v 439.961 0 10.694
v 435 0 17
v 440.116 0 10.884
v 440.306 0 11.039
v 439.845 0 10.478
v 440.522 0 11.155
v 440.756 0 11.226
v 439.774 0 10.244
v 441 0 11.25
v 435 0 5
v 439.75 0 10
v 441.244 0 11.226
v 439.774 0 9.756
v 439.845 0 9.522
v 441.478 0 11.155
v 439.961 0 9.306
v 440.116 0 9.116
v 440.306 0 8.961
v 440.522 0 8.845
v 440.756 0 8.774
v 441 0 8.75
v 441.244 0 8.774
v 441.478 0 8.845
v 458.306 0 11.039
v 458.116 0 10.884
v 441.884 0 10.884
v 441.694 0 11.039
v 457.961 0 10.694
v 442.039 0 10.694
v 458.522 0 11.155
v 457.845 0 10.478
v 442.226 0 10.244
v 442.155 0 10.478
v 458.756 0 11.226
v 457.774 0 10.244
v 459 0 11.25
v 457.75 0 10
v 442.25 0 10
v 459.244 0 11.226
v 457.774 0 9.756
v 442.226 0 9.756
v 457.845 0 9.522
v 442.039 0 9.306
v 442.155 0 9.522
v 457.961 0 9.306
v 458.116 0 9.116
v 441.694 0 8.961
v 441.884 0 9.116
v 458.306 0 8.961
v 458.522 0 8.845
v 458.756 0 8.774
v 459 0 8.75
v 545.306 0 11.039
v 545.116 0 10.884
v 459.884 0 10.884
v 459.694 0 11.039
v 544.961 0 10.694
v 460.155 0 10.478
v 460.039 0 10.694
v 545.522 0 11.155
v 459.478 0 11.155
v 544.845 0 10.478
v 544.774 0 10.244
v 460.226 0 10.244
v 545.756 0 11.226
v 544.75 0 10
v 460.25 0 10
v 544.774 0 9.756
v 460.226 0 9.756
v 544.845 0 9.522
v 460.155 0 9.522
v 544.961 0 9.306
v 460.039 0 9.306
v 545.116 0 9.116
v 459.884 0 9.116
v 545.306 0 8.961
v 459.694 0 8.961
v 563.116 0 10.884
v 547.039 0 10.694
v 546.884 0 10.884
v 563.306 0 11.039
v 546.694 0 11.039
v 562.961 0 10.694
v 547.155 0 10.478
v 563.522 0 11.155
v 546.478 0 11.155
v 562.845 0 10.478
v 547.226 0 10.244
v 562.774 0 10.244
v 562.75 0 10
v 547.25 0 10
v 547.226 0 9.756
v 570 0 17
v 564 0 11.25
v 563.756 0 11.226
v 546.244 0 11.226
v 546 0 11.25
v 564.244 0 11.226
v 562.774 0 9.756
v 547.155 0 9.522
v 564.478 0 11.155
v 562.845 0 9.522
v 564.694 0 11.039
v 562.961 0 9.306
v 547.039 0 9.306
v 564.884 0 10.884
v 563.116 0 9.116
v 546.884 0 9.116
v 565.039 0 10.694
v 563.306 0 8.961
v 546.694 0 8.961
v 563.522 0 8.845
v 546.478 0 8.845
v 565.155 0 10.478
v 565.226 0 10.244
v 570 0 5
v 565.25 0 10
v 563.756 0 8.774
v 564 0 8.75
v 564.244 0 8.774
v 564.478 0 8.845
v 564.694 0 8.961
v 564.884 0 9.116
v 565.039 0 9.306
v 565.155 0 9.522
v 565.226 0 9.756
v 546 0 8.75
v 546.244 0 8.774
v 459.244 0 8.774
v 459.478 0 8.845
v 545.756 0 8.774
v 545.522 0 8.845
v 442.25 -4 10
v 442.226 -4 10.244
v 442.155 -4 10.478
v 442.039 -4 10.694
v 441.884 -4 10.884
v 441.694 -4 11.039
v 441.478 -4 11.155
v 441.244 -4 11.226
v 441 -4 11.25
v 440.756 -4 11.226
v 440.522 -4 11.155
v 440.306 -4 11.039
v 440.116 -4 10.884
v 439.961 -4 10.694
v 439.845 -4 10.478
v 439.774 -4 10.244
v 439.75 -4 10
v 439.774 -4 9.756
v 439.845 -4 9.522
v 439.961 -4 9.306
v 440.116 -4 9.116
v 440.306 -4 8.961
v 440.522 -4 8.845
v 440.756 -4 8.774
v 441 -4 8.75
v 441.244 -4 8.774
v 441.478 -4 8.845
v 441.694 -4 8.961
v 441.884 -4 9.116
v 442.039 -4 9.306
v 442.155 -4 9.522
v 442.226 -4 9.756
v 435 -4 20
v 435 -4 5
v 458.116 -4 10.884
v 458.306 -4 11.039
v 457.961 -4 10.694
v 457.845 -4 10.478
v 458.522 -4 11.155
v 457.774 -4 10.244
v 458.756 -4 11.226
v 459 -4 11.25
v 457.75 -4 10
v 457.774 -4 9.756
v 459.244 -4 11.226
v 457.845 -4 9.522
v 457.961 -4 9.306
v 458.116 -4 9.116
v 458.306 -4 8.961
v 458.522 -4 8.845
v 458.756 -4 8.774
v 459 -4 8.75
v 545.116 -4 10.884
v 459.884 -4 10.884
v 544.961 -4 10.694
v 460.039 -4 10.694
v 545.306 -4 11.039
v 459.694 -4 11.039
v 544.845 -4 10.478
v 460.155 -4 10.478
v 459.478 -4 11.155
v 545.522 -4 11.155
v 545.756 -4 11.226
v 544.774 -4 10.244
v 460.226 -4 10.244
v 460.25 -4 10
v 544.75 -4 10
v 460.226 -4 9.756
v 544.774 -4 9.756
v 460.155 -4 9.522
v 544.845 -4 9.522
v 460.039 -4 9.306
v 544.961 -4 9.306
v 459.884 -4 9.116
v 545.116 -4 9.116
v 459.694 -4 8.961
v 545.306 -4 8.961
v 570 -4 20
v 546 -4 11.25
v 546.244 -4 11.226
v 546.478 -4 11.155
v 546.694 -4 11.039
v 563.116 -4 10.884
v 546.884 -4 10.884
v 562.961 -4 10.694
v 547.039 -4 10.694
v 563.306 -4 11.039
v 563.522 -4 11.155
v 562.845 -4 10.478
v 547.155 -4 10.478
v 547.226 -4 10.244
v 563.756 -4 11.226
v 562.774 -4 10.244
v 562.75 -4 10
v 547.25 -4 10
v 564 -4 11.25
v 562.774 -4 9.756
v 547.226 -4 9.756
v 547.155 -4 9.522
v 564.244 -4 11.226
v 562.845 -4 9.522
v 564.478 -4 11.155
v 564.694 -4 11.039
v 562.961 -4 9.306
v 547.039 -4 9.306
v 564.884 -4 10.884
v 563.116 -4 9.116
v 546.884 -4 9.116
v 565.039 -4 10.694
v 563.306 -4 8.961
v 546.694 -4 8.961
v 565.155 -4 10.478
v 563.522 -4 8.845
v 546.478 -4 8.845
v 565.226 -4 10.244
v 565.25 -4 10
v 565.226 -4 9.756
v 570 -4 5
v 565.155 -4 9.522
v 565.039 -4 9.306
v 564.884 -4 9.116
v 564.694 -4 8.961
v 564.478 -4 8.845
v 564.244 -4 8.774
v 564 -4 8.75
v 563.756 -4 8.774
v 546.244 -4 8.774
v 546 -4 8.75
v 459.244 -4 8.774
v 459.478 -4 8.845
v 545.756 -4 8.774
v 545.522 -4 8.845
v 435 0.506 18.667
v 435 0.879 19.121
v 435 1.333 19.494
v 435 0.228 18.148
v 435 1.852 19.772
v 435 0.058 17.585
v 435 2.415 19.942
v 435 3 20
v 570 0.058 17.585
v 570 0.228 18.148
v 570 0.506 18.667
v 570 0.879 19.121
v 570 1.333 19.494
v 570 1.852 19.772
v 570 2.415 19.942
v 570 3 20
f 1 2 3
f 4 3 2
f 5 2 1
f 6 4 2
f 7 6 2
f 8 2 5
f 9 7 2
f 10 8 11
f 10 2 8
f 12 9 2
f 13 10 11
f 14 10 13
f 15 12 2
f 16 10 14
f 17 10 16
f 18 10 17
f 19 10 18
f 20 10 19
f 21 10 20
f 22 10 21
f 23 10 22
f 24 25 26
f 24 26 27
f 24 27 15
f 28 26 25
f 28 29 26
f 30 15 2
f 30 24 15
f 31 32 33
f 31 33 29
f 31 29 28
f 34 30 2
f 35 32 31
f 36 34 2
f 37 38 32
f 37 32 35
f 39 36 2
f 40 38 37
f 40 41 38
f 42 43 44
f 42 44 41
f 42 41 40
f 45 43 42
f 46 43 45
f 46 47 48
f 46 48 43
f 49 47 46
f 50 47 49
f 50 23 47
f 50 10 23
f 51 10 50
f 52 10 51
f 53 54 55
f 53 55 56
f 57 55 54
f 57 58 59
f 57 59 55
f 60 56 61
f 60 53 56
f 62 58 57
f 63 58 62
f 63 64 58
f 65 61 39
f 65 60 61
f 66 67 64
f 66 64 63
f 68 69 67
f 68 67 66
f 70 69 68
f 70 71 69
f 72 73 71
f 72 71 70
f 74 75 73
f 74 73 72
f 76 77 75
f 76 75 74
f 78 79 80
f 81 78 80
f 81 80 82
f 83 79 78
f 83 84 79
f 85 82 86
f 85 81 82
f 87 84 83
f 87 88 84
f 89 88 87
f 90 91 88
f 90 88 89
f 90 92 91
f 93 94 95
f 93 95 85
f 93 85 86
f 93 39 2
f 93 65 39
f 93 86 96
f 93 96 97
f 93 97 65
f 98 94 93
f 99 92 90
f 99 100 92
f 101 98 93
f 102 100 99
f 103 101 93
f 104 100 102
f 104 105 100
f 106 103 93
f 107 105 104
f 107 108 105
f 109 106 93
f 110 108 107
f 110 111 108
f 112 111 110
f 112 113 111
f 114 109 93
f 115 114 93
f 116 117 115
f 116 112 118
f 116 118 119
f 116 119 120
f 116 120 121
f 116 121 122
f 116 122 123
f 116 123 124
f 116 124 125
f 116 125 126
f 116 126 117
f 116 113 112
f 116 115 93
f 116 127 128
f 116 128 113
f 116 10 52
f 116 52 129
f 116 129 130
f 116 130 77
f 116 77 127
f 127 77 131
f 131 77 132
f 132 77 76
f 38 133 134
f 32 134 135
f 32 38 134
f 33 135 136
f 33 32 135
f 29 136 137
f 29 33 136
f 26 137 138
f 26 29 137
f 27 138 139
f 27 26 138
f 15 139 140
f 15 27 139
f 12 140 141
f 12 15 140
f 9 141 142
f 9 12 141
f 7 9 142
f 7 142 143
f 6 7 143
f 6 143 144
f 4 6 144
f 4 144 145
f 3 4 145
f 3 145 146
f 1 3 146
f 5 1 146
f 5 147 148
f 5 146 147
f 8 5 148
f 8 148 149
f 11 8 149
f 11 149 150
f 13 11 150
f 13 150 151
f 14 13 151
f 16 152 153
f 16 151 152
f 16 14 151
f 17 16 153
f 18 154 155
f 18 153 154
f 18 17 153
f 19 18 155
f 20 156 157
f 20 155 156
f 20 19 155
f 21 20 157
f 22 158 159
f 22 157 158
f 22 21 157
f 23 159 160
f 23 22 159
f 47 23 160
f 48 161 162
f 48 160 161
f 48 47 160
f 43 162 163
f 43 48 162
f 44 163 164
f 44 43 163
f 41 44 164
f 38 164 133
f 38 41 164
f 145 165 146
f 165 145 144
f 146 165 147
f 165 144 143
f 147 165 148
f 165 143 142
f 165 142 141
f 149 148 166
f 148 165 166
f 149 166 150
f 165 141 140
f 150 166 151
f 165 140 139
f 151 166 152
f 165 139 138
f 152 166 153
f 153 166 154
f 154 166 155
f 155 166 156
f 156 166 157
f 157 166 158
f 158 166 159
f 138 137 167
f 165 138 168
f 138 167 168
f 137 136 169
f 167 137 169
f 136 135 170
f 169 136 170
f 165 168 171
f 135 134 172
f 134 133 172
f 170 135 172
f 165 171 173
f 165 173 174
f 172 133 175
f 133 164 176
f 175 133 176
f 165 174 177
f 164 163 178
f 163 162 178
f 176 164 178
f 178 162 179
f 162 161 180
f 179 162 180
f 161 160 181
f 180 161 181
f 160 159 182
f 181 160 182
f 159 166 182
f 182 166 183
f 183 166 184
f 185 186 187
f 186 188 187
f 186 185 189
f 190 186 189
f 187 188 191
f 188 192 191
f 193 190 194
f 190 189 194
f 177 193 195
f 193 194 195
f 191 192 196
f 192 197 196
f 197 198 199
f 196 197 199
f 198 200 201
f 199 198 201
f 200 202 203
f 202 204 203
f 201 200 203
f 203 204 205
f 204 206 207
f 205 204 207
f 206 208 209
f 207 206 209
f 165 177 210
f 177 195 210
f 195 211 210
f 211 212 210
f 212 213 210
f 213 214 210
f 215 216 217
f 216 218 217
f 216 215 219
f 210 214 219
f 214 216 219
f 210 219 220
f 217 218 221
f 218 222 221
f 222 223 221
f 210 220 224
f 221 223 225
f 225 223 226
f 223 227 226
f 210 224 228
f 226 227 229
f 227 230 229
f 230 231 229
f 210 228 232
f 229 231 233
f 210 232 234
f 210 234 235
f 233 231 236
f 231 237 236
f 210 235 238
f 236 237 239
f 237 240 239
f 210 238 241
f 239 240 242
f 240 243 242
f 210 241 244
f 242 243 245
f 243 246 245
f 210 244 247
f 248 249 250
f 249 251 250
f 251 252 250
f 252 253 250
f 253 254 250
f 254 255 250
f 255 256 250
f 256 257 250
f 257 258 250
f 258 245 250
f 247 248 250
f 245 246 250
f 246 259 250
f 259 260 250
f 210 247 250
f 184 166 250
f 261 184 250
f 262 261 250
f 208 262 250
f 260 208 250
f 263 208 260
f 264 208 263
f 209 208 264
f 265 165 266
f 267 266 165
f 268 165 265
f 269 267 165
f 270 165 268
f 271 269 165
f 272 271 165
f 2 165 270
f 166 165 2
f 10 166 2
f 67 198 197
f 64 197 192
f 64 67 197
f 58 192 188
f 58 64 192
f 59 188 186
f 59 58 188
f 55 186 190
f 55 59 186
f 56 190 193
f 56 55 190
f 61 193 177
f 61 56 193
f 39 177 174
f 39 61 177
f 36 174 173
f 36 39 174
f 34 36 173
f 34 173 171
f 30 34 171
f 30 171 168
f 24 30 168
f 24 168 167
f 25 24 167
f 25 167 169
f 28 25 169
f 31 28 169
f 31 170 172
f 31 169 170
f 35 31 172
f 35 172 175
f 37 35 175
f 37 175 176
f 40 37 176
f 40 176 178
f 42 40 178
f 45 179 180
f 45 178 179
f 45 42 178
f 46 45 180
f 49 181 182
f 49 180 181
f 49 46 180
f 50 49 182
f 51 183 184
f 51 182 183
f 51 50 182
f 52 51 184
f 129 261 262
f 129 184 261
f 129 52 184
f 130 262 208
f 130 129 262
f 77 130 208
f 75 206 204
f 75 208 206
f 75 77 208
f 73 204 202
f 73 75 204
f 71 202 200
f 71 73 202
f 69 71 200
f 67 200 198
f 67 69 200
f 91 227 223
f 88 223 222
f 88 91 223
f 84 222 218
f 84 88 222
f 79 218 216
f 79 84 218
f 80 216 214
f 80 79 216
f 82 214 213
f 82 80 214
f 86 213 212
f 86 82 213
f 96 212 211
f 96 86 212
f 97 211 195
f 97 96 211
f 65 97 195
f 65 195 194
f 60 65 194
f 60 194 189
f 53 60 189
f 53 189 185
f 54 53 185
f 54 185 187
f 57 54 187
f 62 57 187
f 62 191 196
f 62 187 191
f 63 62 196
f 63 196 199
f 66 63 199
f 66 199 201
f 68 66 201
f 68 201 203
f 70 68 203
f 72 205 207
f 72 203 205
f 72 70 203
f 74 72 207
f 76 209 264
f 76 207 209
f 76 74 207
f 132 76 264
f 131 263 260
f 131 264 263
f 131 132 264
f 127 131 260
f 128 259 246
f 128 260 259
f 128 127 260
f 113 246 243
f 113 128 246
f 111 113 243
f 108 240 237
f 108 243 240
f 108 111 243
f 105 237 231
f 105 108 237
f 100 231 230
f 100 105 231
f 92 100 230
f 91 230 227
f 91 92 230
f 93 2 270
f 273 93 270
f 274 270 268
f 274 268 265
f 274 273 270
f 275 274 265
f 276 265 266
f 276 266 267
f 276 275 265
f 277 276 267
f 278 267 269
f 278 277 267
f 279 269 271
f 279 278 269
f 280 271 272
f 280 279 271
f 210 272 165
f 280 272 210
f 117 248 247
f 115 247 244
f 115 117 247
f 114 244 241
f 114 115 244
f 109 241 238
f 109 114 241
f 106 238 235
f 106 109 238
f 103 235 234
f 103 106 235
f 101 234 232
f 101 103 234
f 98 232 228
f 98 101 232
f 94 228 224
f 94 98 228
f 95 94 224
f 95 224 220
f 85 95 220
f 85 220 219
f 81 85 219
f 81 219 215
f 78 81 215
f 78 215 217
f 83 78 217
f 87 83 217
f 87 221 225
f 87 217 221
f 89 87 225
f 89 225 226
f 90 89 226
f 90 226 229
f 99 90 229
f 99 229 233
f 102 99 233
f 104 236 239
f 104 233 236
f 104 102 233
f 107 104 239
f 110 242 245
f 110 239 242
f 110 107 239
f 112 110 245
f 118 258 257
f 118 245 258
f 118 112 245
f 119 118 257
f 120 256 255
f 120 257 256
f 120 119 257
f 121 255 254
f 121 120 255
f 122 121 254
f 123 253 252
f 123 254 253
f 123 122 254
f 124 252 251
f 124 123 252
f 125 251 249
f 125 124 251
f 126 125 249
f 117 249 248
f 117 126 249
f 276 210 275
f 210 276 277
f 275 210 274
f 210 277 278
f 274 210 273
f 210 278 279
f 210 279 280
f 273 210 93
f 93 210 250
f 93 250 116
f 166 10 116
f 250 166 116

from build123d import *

# Parameters (mm, degrees)
CYLINDER183_R     = 1.25
CYLINDER183_DEPTH = 10
CYLINDER182_R     = 1.25
CYLINDER182_DEPTH = 10
CYLINDER181_R     = 1.25
CYLINDER181_DEPTH = 10
CYLINDER180_R     = 1.25
CYLINDER180_DEPTH = 10
BOX092_W          = 135
BOX092_H          = 10
BOX092_DEPTH      = 15
FILLET049_R       = 3
BOX093_W          = 135
BOX093_H          = 10
BOX093_DEPTH      = 15


with BuildPart() as cylinder183:
    # Cylinder183 → Cylinder183 (new body)
    with BuildSketch(Plane(origin=(564, 0, 10), x_dir=(1, 0, 0), z_dir=(0, -1, 0))):
        Circle(CYLINDER183_R)
    extrude(amount=CYLINDER183_DEPTH)


with BuildPart() as cylinder182:
    # Cylinder182 → Cylinder182 (new body)
    with BuildSketch(Plane(origin=(546, 0, 10), x_dir=(1, 0, 0), z_dir=(0, -1, 0))):
        Circle(CYLINDER182_R)
    extrude(amount=CYLINDER182_DEPTH)


with BuildPart() as cylinder181:
    # Cylinder181 → Cylinder181 (new body)
    with BuildSketch(Plane(origin=(459, 0, 10), x_dir=(1, 0, 0), z_dir=(0, -1, 0))):
        Circle(CYLINDER181_R)
    extrude(amount=CYLINDER181_DEPTH)


with BuildPart() as fusion155:
    # Cylinder180 → Cylinder180 (new body)
    with BuildSketch(Plane(origin=(441, 0, 10), x_dir=(1, 0, 0), z_dir=(0, -1, 0))):
        Circle(CYLINDER180_R)
    extrude(amount=CYLINDER180_DEPTH)

    # Fusion155: union Cylinder183, Cylinder182, Cylinder181
    add(cylinder183.part)
    add(cylinder182.part)
    add(cylinder181.part)


with BuildPart() as fillet049:
    # Box092 → Box092 (new body)
    with BuildSketch(Plane(origin=(435, 0, 5), x_dir=(1, 0, 0), z_dir=(0, 0, 1))):
        with Locations((67.5, 5)):
            Rectangle(BOX092_W, BOX092_H)
    extrude(amount=BOX092_DEPTH)

    # Fillet049
    fillet049_edges = [fillet049.edges().sort_by_distance(p)[0] for p in [
        (502.5, 0, 20),
    ]]
    fillet(fillet049_edges, radius=FILLET049_R)


with BuildPart() as fenders_holes:
    # Box093 → Box093 (new body)
    with BuildSketch(Plane(origin=(435, -4, 5), x_dir=(1, 0, 0), z_dir=(0, 0, 1))):
        with Locations((67.5, 5)):
            Rectangle(BOX093_W, BOX093_H)
    extrude(amount=BOX093_DEPTH)

    # Cut112: cut Fillet049
    add(fillet049.part, mode=Mode.SUBTRACT)

    # Cut113: cut Fusion155
    add(fusion155.part, mode=Mode.SUBTRACT)


solid = fenders_holes.part
